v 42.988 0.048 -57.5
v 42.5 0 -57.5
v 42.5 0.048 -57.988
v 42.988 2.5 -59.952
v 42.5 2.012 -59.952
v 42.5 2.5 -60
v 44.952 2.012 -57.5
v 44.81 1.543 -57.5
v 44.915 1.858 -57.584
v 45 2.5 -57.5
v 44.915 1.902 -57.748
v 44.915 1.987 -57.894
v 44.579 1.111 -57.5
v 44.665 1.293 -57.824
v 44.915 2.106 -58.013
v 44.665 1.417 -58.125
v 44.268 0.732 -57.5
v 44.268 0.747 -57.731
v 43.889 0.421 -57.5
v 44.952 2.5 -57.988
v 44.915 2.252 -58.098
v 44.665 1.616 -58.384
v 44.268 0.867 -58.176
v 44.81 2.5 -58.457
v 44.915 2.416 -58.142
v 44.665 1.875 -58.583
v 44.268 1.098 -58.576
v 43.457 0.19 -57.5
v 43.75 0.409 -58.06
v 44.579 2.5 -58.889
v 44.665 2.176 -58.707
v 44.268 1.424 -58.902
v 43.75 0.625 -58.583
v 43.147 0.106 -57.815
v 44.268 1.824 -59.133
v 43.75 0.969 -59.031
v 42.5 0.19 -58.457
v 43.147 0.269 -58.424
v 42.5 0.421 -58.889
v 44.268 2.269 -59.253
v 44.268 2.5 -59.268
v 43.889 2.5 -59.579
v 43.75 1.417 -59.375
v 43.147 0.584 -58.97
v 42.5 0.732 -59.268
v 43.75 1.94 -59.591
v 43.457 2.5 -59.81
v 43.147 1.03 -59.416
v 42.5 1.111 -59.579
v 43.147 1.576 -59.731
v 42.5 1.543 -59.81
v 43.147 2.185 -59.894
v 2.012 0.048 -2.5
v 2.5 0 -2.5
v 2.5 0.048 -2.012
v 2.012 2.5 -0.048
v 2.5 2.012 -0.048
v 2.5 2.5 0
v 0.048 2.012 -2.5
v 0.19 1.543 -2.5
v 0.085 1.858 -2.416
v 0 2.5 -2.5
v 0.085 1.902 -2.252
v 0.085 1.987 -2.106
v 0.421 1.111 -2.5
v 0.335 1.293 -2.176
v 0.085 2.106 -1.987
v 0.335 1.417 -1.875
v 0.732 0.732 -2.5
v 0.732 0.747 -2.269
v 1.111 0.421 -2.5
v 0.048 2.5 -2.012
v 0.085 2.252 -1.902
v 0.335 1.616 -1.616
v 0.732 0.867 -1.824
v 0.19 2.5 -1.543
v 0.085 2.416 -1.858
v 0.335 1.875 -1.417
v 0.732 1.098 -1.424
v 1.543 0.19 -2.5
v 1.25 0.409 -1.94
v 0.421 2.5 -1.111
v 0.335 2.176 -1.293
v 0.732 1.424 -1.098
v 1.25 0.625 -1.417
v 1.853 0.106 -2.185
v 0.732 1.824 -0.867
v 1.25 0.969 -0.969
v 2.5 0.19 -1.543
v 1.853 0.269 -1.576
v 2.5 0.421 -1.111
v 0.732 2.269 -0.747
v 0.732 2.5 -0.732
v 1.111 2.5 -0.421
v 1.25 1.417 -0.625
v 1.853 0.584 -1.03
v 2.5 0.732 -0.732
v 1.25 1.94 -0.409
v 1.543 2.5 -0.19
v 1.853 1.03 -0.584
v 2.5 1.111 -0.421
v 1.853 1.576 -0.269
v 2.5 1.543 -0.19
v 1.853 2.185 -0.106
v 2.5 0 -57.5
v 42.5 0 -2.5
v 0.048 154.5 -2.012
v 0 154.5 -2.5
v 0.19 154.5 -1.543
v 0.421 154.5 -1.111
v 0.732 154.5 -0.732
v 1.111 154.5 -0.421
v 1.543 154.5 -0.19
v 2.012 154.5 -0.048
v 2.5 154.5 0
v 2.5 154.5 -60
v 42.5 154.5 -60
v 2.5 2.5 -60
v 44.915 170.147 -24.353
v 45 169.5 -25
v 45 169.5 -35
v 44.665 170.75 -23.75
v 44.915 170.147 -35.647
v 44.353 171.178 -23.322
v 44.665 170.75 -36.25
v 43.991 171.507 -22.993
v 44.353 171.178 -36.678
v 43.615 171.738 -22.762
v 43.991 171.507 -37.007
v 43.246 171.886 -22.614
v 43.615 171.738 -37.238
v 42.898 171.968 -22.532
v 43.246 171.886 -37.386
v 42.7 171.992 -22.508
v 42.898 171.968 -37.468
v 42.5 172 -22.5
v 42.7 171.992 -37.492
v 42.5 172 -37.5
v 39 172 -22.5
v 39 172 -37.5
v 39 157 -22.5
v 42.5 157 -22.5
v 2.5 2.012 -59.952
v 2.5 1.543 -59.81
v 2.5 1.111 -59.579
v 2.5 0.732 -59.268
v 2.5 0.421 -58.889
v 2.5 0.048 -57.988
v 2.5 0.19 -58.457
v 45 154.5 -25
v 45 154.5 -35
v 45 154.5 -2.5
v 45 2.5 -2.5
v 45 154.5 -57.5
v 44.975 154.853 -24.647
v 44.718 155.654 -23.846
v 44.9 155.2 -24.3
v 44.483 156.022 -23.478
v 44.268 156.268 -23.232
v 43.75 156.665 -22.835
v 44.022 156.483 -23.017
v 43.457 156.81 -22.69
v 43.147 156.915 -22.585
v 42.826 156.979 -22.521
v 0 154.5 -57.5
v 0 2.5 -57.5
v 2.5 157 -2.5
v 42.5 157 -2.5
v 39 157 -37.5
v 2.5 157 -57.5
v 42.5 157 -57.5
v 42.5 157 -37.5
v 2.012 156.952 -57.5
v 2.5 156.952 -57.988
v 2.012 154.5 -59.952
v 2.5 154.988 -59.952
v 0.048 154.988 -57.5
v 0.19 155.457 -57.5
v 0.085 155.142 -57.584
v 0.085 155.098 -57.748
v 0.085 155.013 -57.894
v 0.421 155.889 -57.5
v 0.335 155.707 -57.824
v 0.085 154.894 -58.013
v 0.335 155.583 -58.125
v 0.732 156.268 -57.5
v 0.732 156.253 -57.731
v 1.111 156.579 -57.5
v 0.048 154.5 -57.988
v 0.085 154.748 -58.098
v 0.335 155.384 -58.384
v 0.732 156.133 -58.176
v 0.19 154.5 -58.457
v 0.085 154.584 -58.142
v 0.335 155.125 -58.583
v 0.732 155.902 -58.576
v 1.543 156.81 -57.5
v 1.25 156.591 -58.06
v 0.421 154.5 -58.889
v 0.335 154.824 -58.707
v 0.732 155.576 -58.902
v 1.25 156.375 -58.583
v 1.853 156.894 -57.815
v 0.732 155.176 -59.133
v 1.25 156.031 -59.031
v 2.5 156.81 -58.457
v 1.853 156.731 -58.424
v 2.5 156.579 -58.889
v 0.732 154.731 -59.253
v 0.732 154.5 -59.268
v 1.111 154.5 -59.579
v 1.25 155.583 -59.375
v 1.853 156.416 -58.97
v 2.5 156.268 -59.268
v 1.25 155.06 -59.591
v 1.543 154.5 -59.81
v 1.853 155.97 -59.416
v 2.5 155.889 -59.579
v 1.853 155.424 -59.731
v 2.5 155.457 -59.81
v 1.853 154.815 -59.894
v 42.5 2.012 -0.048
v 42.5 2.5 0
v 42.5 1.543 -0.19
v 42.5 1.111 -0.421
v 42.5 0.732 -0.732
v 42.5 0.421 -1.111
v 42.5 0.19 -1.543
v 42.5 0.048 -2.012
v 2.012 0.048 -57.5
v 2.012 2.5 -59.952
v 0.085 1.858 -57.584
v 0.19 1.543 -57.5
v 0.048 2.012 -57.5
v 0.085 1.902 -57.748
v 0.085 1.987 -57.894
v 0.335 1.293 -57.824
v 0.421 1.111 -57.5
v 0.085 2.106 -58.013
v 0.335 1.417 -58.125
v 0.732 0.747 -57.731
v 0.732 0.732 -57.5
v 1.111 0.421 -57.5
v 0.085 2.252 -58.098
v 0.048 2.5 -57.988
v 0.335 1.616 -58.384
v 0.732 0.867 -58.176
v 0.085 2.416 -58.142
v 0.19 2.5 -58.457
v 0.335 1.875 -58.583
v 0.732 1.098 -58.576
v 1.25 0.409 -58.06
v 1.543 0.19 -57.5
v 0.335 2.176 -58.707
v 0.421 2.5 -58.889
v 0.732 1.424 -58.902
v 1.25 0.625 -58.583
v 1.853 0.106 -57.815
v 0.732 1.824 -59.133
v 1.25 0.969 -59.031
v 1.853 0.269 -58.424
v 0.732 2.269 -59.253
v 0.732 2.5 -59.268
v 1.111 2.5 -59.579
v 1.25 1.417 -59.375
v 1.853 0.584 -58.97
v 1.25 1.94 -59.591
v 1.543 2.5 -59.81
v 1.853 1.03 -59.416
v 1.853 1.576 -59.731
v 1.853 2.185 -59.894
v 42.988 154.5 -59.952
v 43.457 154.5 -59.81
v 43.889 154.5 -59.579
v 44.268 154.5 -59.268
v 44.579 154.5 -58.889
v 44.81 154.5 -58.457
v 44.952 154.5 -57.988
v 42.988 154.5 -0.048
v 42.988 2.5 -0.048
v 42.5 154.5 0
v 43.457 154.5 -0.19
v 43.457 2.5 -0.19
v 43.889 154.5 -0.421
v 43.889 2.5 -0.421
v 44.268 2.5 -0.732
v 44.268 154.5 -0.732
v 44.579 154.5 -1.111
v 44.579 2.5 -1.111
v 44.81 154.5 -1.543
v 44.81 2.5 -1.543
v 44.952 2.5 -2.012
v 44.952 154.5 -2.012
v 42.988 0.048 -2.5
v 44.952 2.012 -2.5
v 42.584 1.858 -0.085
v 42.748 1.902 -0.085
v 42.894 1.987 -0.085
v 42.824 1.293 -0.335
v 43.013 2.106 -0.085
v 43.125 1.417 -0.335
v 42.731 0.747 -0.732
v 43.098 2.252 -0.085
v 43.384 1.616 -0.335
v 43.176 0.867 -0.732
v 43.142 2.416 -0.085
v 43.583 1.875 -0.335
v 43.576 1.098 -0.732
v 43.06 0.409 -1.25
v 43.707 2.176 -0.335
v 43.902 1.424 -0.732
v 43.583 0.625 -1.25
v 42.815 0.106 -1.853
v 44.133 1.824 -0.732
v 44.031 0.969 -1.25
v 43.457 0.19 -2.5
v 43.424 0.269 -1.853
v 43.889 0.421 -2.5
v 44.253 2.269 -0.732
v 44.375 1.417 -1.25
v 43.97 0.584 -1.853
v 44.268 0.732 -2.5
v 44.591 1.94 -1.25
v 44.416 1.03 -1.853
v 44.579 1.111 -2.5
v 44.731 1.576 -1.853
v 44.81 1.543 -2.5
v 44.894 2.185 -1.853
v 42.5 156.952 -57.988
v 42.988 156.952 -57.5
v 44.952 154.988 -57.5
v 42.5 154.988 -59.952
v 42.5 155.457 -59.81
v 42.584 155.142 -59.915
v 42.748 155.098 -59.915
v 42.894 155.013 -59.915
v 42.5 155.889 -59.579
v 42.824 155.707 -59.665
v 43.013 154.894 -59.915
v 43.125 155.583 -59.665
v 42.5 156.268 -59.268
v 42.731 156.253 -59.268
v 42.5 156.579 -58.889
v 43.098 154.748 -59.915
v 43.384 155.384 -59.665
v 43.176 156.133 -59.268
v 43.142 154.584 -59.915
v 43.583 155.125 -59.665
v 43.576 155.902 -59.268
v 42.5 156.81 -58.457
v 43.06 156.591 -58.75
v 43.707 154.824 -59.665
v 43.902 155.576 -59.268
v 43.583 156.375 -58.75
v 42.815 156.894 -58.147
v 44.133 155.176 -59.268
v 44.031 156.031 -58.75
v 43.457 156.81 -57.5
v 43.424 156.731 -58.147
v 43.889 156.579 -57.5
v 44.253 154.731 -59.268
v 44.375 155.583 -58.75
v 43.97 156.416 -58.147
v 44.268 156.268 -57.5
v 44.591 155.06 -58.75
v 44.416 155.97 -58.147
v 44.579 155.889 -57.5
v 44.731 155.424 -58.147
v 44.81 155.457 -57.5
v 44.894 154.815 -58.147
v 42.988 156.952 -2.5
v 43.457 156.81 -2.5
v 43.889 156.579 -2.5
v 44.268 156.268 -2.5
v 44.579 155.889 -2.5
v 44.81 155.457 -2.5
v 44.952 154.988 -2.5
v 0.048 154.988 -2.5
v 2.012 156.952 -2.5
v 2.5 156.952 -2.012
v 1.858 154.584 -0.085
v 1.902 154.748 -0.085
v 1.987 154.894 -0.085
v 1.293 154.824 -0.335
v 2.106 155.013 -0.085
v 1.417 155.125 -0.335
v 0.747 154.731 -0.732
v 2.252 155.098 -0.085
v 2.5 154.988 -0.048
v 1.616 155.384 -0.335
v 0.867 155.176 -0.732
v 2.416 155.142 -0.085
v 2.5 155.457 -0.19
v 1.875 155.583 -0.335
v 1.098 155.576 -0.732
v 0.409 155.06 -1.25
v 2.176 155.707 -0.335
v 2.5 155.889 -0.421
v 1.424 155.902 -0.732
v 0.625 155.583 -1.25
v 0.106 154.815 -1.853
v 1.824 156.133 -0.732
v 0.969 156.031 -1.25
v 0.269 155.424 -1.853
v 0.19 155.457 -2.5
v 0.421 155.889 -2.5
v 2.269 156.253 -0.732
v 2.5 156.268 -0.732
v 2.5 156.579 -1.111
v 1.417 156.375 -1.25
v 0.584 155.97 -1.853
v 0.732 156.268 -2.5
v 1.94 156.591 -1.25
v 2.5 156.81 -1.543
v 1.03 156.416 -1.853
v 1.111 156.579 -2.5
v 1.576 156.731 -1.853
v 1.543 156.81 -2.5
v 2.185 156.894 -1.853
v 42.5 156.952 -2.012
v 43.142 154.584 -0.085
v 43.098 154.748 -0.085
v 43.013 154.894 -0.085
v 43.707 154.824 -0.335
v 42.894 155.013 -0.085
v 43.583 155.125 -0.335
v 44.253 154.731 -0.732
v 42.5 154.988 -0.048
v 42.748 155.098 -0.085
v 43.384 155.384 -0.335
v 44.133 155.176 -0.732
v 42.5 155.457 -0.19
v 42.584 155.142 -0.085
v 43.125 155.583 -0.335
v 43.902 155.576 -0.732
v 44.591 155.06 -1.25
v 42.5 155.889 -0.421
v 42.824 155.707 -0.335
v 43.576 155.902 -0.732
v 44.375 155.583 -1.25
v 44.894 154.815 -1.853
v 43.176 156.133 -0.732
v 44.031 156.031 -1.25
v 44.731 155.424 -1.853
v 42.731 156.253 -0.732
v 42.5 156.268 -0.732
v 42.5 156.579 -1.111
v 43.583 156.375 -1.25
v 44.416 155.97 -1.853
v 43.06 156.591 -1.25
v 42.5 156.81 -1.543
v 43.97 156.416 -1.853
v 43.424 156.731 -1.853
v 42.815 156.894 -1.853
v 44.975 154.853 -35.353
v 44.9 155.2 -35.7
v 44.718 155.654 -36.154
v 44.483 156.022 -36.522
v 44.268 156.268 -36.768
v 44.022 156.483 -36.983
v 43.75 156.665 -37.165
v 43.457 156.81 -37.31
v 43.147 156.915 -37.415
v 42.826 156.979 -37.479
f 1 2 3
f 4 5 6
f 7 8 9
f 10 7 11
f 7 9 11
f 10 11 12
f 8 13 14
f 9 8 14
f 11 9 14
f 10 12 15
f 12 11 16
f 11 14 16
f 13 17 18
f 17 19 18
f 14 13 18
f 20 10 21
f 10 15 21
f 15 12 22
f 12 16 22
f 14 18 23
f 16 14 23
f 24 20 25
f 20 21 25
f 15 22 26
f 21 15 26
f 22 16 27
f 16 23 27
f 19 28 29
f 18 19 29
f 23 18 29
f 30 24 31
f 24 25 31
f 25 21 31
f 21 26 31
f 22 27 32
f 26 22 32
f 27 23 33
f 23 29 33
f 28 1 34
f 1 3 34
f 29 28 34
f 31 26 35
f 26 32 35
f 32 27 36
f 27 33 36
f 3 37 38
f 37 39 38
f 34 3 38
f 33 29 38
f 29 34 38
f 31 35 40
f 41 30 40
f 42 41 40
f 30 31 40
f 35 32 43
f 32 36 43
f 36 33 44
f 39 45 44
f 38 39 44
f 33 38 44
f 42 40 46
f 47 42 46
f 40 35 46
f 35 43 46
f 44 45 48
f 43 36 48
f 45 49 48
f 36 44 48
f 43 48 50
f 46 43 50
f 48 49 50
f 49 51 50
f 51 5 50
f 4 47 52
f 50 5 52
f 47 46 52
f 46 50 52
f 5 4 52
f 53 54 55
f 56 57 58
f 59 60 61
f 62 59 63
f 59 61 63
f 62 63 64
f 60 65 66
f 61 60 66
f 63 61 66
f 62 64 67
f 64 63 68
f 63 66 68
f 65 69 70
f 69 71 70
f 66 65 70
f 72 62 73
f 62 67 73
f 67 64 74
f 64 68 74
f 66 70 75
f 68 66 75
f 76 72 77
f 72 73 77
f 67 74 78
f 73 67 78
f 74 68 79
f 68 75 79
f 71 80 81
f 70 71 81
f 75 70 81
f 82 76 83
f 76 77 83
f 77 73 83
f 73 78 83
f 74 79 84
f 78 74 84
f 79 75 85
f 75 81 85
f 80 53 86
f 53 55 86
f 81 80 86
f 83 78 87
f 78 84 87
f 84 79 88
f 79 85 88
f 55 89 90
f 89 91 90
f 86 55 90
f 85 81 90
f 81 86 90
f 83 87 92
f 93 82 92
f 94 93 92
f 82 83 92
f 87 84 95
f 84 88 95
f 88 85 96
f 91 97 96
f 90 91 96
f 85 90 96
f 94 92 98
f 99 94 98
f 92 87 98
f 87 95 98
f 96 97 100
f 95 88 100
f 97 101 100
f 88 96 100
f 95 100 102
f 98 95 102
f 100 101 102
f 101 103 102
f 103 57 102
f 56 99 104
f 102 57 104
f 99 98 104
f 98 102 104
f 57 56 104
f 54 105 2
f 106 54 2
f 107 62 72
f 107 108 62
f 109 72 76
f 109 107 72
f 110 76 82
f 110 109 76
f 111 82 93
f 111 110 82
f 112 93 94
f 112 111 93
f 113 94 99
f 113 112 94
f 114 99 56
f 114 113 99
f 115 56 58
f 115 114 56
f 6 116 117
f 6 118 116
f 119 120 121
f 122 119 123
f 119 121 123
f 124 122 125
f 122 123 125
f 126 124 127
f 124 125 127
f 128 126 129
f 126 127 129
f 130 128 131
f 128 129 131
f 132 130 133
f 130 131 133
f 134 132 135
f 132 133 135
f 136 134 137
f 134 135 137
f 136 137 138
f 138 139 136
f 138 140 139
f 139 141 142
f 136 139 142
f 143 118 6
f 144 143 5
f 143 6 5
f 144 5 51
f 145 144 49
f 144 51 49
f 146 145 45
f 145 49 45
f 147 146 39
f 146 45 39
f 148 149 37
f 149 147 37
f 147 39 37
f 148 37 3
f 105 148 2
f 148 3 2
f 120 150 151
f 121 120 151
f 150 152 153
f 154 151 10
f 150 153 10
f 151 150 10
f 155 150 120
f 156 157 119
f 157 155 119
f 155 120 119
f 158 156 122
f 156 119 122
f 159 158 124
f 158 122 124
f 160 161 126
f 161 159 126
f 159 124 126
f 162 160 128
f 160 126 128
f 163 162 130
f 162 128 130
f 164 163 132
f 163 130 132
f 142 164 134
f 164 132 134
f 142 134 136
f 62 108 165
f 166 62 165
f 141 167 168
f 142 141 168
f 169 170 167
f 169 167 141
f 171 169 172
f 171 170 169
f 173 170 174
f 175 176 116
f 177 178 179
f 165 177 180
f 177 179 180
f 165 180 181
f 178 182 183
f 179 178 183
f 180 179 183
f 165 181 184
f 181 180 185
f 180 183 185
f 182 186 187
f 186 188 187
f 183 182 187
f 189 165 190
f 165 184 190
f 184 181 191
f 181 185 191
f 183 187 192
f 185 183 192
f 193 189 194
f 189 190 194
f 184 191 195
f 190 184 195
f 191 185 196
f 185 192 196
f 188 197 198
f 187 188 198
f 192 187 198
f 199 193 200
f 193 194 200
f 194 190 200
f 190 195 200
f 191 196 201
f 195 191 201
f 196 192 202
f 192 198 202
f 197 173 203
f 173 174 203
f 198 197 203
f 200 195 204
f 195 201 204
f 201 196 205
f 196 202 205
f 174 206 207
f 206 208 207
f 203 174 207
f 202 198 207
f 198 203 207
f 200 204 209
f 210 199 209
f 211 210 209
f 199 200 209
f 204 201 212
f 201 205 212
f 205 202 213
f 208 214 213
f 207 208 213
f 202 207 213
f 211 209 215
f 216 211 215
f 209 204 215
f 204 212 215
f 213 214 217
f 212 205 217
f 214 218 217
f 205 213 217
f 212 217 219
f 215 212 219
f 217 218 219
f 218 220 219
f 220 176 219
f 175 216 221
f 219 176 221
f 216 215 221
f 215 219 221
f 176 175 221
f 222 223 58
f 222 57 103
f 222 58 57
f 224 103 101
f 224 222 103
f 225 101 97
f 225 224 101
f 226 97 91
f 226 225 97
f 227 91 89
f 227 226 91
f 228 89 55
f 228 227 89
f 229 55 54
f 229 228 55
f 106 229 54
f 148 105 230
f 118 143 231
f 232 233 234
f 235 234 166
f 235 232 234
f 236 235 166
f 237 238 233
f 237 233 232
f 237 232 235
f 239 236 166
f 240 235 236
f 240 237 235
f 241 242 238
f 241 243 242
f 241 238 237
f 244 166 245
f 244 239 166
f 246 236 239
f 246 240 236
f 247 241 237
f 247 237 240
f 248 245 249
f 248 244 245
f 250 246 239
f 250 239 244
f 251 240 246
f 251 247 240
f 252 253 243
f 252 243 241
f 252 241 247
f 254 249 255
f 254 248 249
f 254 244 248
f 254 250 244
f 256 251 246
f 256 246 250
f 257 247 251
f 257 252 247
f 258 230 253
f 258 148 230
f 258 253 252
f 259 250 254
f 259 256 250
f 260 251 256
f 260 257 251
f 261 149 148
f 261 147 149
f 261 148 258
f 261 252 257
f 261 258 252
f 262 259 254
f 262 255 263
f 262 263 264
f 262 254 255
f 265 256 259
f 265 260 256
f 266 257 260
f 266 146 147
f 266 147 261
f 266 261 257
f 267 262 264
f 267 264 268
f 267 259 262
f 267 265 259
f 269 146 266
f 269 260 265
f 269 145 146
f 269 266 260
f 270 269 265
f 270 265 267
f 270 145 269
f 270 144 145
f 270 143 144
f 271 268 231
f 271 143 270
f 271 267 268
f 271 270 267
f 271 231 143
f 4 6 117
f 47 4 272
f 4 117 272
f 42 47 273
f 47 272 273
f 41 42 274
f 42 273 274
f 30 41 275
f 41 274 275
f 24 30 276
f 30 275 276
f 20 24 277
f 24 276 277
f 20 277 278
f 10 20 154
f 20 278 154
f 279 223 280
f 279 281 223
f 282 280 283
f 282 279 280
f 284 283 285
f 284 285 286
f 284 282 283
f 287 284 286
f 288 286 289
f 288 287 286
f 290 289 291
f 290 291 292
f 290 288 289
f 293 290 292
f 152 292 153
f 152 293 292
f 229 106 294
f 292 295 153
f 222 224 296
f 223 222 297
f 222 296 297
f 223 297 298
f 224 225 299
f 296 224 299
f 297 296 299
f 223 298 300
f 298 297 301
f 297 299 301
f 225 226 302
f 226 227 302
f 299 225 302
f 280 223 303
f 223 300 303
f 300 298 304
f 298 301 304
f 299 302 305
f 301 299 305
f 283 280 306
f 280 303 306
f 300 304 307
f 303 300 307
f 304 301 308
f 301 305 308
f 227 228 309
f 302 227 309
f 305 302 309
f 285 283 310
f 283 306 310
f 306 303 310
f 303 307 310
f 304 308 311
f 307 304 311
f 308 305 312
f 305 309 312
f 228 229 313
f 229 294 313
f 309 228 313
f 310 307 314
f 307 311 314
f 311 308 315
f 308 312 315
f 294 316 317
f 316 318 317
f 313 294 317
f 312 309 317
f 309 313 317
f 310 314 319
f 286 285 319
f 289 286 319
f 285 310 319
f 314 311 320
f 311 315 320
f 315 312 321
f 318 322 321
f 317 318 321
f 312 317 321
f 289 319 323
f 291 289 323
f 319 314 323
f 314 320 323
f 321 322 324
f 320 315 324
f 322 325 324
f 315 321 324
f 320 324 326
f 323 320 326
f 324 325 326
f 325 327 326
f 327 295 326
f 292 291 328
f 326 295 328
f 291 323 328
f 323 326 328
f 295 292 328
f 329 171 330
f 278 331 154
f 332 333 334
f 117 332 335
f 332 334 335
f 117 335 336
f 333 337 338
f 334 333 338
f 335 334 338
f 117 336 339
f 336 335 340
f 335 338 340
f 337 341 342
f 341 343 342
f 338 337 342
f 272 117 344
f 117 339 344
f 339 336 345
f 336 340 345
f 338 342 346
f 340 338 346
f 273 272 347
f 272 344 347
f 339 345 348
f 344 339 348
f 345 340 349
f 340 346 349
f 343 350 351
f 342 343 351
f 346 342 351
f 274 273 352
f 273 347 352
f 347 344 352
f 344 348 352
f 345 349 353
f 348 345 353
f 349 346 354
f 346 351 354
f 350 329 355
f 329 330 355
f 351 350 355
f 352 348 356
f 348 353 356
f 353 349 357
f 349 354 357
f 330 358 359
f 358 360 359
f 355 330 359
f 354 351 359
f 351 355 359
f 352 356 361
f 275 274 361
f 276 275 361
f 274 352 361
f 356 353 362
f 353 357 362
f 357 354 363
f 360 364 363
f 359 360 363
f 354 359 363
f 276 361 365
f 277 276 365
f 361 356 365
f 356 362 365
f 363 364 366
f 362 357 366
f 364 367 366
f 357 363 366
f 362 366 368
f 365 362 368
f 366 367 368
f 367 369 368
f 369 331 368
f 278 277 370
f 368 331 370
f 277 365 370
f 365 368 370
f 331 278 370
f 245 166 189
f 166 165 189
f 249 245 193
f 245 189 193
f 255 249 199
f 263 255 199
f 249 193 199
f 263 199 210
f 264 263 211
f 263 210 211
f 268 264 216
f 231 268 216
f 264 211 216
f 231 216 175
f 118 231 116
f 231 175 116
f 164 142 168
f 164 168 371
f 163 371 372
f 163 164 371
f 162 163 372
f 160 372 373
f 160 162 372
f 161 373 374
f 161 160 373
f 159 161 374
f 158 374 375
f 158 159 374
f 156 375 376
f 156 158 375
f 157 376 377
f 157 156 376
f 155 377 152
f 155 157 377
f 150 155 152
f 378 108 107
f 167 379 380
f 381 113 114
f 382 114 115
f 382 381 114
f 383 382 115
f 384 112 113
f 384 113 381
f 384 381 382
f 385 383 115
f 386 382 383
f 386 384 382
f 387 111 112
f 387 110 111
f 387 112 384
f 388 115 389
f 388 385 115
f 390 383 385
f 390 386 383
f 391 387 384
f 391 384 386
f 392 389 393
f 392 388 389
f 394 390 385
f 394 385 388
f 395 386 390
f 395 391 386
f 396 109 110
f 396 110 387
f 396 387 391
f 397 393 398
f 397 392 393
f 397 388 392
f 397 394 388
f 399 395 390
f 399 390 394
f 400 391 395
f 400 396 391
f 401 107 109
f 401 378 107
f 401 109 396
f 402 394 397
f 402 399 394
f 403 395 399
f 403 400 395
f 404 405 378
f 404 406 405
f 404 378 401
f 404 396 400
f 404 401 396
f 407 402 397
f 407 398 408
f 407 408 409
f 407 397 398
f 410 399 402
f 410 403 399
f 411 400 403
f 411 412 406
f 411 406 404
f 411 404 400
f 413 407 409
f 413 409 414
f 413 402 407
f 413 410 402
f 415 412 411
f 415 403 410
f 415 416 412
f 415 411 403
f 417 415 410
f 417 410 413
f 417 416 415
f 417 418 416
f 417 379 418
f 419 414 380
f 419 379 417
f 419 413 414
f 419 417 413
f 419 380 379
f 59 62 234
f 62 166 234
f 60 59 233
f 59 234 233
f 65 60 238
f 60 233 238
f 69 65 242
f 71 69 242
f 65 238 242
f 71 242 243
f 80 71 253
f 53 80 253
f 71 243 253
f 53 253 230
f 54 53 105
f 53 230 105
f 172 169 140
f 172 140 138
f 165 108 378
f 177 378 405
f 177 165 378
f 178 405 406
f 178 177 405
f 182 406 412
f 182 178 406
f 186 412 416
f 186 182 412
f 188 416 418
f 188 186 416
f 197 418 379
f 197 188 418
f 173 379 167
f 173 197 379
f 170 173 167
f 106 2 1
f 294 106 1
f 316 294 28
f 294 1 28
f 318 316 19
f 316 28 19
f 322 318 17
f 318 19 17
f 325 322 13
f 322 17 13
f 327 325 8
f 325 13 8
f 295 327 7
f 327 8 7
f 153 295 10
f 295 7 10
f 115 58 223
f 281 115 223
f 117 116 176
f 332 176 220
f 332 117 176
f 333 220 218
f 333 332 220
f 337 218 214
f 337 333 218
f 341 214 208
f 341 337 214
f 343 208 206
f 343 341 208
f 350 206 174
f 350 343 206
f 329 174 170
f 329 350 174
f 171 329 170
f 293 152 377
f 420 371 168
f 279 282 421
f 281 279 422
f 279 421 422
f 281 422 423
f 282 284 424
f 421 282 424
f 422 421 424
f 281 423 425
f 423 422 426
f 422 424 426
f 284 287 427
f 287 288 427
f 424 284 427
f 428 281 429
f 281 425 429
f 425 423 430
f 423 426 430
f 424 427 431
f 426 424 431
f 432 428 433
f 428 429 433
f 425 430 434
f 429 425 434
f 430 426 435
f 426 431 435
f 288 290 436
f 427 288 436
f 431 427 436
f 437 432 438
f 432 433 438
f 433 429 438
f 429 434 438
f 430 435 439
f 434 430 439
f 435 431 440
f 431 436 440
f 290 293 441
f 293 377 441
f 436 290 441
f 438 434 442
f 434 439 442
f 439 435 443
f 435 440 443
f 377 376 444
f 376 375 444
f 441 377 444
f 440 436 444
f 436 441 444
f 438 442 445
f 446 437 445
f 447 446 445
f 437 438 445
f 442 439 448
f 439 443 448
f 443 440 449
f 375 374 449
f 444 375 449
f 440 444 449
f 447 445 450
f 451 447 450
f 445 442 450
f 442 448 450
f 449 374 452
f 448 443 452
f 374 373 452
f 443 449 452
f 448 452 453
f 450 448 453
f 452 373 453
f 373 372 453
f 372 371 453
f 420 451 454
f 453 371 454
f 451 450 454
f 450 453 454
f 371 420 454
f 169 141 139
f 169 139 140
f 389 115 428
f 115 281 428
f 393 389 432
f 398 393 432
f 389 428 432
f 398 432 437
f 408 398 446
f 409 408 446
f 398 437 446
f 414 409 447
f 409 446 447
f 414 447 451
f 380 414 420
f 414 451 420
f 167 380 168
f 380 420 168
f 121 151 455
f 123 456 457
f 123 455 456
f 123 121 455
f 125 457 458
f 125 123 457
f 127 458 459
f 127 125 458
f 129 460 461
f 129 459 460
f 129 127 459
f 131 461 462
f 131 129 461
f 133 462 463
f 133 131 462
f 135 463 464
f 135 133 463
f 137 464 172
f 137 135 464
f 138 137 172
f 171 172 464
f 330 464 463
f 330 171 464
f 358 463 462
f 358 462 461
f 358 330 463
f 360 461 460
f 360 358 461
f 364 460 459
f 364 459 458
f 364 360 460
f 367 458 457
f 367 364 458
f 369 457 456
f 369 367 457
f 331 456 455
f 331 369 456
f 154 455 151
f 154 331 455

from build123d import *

# Parameters (mm, degrees)
SKETCH1_W           = 45
SKETCH1_H           = 60
BOSS_EXTRUDE1_DEPTH = 157
SKETCH2_W           = 6
SKETCH2_H           = 15
BOSS_EXTRUDE2_DEPTH = 15
FILLET1_R           = 2.5


with BuildPart() as part:
    # Sketch1 → Boss-Extrude1 (new body)
    with BuildSketch(Plane(origin=(0, 0, 0), x_dir=(1, 0, 0), z_dir=(0, 1, 0))):
        with Locations((22.5, 30)):
            Rectangle(SKETCH1_W, SKETCH1_H)
    extrude(amount=BOSS_EXTRUDE1_DEPTH)

    # Sketch2 → Boss-Extrude2 (add)
    with BuildSketch(Plane(origin=(0, 157, 0), x_dir=(1, 0, 0), z_dir=(0, 1, 0))):
        with Locations((42, 30)):
            Rectangle(SKETCH2_W, SKETCH2_H)
    extrude(amount=BOSS_EXTRUDE2_DEPTH)

    # Fillet1
    fillet1_edges = [part.edges().sort_by_distance(p)[0] for p in [
        (45, 157, -11.25),
        (45, 157, -48.75),
        (45, 164.5, -22.5),
        (45, 164.5, -37.5),
        (22.5, 157, -60),
        (45, 172, -30),
        (0, 157, -30),
        (22.5, 0, -60),
        (45, 0, -30),
        (22.5, 0, 0),
        (0, 0, -30),
        (0, 78.5, -60),
        (45, 78.5, -60),
        (45, 78.5, 0),
        (0, 78.5, 0),
        (22.5, 157, 0),
    ]]
    fillet(fillet1_edges, radius=FILLET1_R)


solid = part.part
